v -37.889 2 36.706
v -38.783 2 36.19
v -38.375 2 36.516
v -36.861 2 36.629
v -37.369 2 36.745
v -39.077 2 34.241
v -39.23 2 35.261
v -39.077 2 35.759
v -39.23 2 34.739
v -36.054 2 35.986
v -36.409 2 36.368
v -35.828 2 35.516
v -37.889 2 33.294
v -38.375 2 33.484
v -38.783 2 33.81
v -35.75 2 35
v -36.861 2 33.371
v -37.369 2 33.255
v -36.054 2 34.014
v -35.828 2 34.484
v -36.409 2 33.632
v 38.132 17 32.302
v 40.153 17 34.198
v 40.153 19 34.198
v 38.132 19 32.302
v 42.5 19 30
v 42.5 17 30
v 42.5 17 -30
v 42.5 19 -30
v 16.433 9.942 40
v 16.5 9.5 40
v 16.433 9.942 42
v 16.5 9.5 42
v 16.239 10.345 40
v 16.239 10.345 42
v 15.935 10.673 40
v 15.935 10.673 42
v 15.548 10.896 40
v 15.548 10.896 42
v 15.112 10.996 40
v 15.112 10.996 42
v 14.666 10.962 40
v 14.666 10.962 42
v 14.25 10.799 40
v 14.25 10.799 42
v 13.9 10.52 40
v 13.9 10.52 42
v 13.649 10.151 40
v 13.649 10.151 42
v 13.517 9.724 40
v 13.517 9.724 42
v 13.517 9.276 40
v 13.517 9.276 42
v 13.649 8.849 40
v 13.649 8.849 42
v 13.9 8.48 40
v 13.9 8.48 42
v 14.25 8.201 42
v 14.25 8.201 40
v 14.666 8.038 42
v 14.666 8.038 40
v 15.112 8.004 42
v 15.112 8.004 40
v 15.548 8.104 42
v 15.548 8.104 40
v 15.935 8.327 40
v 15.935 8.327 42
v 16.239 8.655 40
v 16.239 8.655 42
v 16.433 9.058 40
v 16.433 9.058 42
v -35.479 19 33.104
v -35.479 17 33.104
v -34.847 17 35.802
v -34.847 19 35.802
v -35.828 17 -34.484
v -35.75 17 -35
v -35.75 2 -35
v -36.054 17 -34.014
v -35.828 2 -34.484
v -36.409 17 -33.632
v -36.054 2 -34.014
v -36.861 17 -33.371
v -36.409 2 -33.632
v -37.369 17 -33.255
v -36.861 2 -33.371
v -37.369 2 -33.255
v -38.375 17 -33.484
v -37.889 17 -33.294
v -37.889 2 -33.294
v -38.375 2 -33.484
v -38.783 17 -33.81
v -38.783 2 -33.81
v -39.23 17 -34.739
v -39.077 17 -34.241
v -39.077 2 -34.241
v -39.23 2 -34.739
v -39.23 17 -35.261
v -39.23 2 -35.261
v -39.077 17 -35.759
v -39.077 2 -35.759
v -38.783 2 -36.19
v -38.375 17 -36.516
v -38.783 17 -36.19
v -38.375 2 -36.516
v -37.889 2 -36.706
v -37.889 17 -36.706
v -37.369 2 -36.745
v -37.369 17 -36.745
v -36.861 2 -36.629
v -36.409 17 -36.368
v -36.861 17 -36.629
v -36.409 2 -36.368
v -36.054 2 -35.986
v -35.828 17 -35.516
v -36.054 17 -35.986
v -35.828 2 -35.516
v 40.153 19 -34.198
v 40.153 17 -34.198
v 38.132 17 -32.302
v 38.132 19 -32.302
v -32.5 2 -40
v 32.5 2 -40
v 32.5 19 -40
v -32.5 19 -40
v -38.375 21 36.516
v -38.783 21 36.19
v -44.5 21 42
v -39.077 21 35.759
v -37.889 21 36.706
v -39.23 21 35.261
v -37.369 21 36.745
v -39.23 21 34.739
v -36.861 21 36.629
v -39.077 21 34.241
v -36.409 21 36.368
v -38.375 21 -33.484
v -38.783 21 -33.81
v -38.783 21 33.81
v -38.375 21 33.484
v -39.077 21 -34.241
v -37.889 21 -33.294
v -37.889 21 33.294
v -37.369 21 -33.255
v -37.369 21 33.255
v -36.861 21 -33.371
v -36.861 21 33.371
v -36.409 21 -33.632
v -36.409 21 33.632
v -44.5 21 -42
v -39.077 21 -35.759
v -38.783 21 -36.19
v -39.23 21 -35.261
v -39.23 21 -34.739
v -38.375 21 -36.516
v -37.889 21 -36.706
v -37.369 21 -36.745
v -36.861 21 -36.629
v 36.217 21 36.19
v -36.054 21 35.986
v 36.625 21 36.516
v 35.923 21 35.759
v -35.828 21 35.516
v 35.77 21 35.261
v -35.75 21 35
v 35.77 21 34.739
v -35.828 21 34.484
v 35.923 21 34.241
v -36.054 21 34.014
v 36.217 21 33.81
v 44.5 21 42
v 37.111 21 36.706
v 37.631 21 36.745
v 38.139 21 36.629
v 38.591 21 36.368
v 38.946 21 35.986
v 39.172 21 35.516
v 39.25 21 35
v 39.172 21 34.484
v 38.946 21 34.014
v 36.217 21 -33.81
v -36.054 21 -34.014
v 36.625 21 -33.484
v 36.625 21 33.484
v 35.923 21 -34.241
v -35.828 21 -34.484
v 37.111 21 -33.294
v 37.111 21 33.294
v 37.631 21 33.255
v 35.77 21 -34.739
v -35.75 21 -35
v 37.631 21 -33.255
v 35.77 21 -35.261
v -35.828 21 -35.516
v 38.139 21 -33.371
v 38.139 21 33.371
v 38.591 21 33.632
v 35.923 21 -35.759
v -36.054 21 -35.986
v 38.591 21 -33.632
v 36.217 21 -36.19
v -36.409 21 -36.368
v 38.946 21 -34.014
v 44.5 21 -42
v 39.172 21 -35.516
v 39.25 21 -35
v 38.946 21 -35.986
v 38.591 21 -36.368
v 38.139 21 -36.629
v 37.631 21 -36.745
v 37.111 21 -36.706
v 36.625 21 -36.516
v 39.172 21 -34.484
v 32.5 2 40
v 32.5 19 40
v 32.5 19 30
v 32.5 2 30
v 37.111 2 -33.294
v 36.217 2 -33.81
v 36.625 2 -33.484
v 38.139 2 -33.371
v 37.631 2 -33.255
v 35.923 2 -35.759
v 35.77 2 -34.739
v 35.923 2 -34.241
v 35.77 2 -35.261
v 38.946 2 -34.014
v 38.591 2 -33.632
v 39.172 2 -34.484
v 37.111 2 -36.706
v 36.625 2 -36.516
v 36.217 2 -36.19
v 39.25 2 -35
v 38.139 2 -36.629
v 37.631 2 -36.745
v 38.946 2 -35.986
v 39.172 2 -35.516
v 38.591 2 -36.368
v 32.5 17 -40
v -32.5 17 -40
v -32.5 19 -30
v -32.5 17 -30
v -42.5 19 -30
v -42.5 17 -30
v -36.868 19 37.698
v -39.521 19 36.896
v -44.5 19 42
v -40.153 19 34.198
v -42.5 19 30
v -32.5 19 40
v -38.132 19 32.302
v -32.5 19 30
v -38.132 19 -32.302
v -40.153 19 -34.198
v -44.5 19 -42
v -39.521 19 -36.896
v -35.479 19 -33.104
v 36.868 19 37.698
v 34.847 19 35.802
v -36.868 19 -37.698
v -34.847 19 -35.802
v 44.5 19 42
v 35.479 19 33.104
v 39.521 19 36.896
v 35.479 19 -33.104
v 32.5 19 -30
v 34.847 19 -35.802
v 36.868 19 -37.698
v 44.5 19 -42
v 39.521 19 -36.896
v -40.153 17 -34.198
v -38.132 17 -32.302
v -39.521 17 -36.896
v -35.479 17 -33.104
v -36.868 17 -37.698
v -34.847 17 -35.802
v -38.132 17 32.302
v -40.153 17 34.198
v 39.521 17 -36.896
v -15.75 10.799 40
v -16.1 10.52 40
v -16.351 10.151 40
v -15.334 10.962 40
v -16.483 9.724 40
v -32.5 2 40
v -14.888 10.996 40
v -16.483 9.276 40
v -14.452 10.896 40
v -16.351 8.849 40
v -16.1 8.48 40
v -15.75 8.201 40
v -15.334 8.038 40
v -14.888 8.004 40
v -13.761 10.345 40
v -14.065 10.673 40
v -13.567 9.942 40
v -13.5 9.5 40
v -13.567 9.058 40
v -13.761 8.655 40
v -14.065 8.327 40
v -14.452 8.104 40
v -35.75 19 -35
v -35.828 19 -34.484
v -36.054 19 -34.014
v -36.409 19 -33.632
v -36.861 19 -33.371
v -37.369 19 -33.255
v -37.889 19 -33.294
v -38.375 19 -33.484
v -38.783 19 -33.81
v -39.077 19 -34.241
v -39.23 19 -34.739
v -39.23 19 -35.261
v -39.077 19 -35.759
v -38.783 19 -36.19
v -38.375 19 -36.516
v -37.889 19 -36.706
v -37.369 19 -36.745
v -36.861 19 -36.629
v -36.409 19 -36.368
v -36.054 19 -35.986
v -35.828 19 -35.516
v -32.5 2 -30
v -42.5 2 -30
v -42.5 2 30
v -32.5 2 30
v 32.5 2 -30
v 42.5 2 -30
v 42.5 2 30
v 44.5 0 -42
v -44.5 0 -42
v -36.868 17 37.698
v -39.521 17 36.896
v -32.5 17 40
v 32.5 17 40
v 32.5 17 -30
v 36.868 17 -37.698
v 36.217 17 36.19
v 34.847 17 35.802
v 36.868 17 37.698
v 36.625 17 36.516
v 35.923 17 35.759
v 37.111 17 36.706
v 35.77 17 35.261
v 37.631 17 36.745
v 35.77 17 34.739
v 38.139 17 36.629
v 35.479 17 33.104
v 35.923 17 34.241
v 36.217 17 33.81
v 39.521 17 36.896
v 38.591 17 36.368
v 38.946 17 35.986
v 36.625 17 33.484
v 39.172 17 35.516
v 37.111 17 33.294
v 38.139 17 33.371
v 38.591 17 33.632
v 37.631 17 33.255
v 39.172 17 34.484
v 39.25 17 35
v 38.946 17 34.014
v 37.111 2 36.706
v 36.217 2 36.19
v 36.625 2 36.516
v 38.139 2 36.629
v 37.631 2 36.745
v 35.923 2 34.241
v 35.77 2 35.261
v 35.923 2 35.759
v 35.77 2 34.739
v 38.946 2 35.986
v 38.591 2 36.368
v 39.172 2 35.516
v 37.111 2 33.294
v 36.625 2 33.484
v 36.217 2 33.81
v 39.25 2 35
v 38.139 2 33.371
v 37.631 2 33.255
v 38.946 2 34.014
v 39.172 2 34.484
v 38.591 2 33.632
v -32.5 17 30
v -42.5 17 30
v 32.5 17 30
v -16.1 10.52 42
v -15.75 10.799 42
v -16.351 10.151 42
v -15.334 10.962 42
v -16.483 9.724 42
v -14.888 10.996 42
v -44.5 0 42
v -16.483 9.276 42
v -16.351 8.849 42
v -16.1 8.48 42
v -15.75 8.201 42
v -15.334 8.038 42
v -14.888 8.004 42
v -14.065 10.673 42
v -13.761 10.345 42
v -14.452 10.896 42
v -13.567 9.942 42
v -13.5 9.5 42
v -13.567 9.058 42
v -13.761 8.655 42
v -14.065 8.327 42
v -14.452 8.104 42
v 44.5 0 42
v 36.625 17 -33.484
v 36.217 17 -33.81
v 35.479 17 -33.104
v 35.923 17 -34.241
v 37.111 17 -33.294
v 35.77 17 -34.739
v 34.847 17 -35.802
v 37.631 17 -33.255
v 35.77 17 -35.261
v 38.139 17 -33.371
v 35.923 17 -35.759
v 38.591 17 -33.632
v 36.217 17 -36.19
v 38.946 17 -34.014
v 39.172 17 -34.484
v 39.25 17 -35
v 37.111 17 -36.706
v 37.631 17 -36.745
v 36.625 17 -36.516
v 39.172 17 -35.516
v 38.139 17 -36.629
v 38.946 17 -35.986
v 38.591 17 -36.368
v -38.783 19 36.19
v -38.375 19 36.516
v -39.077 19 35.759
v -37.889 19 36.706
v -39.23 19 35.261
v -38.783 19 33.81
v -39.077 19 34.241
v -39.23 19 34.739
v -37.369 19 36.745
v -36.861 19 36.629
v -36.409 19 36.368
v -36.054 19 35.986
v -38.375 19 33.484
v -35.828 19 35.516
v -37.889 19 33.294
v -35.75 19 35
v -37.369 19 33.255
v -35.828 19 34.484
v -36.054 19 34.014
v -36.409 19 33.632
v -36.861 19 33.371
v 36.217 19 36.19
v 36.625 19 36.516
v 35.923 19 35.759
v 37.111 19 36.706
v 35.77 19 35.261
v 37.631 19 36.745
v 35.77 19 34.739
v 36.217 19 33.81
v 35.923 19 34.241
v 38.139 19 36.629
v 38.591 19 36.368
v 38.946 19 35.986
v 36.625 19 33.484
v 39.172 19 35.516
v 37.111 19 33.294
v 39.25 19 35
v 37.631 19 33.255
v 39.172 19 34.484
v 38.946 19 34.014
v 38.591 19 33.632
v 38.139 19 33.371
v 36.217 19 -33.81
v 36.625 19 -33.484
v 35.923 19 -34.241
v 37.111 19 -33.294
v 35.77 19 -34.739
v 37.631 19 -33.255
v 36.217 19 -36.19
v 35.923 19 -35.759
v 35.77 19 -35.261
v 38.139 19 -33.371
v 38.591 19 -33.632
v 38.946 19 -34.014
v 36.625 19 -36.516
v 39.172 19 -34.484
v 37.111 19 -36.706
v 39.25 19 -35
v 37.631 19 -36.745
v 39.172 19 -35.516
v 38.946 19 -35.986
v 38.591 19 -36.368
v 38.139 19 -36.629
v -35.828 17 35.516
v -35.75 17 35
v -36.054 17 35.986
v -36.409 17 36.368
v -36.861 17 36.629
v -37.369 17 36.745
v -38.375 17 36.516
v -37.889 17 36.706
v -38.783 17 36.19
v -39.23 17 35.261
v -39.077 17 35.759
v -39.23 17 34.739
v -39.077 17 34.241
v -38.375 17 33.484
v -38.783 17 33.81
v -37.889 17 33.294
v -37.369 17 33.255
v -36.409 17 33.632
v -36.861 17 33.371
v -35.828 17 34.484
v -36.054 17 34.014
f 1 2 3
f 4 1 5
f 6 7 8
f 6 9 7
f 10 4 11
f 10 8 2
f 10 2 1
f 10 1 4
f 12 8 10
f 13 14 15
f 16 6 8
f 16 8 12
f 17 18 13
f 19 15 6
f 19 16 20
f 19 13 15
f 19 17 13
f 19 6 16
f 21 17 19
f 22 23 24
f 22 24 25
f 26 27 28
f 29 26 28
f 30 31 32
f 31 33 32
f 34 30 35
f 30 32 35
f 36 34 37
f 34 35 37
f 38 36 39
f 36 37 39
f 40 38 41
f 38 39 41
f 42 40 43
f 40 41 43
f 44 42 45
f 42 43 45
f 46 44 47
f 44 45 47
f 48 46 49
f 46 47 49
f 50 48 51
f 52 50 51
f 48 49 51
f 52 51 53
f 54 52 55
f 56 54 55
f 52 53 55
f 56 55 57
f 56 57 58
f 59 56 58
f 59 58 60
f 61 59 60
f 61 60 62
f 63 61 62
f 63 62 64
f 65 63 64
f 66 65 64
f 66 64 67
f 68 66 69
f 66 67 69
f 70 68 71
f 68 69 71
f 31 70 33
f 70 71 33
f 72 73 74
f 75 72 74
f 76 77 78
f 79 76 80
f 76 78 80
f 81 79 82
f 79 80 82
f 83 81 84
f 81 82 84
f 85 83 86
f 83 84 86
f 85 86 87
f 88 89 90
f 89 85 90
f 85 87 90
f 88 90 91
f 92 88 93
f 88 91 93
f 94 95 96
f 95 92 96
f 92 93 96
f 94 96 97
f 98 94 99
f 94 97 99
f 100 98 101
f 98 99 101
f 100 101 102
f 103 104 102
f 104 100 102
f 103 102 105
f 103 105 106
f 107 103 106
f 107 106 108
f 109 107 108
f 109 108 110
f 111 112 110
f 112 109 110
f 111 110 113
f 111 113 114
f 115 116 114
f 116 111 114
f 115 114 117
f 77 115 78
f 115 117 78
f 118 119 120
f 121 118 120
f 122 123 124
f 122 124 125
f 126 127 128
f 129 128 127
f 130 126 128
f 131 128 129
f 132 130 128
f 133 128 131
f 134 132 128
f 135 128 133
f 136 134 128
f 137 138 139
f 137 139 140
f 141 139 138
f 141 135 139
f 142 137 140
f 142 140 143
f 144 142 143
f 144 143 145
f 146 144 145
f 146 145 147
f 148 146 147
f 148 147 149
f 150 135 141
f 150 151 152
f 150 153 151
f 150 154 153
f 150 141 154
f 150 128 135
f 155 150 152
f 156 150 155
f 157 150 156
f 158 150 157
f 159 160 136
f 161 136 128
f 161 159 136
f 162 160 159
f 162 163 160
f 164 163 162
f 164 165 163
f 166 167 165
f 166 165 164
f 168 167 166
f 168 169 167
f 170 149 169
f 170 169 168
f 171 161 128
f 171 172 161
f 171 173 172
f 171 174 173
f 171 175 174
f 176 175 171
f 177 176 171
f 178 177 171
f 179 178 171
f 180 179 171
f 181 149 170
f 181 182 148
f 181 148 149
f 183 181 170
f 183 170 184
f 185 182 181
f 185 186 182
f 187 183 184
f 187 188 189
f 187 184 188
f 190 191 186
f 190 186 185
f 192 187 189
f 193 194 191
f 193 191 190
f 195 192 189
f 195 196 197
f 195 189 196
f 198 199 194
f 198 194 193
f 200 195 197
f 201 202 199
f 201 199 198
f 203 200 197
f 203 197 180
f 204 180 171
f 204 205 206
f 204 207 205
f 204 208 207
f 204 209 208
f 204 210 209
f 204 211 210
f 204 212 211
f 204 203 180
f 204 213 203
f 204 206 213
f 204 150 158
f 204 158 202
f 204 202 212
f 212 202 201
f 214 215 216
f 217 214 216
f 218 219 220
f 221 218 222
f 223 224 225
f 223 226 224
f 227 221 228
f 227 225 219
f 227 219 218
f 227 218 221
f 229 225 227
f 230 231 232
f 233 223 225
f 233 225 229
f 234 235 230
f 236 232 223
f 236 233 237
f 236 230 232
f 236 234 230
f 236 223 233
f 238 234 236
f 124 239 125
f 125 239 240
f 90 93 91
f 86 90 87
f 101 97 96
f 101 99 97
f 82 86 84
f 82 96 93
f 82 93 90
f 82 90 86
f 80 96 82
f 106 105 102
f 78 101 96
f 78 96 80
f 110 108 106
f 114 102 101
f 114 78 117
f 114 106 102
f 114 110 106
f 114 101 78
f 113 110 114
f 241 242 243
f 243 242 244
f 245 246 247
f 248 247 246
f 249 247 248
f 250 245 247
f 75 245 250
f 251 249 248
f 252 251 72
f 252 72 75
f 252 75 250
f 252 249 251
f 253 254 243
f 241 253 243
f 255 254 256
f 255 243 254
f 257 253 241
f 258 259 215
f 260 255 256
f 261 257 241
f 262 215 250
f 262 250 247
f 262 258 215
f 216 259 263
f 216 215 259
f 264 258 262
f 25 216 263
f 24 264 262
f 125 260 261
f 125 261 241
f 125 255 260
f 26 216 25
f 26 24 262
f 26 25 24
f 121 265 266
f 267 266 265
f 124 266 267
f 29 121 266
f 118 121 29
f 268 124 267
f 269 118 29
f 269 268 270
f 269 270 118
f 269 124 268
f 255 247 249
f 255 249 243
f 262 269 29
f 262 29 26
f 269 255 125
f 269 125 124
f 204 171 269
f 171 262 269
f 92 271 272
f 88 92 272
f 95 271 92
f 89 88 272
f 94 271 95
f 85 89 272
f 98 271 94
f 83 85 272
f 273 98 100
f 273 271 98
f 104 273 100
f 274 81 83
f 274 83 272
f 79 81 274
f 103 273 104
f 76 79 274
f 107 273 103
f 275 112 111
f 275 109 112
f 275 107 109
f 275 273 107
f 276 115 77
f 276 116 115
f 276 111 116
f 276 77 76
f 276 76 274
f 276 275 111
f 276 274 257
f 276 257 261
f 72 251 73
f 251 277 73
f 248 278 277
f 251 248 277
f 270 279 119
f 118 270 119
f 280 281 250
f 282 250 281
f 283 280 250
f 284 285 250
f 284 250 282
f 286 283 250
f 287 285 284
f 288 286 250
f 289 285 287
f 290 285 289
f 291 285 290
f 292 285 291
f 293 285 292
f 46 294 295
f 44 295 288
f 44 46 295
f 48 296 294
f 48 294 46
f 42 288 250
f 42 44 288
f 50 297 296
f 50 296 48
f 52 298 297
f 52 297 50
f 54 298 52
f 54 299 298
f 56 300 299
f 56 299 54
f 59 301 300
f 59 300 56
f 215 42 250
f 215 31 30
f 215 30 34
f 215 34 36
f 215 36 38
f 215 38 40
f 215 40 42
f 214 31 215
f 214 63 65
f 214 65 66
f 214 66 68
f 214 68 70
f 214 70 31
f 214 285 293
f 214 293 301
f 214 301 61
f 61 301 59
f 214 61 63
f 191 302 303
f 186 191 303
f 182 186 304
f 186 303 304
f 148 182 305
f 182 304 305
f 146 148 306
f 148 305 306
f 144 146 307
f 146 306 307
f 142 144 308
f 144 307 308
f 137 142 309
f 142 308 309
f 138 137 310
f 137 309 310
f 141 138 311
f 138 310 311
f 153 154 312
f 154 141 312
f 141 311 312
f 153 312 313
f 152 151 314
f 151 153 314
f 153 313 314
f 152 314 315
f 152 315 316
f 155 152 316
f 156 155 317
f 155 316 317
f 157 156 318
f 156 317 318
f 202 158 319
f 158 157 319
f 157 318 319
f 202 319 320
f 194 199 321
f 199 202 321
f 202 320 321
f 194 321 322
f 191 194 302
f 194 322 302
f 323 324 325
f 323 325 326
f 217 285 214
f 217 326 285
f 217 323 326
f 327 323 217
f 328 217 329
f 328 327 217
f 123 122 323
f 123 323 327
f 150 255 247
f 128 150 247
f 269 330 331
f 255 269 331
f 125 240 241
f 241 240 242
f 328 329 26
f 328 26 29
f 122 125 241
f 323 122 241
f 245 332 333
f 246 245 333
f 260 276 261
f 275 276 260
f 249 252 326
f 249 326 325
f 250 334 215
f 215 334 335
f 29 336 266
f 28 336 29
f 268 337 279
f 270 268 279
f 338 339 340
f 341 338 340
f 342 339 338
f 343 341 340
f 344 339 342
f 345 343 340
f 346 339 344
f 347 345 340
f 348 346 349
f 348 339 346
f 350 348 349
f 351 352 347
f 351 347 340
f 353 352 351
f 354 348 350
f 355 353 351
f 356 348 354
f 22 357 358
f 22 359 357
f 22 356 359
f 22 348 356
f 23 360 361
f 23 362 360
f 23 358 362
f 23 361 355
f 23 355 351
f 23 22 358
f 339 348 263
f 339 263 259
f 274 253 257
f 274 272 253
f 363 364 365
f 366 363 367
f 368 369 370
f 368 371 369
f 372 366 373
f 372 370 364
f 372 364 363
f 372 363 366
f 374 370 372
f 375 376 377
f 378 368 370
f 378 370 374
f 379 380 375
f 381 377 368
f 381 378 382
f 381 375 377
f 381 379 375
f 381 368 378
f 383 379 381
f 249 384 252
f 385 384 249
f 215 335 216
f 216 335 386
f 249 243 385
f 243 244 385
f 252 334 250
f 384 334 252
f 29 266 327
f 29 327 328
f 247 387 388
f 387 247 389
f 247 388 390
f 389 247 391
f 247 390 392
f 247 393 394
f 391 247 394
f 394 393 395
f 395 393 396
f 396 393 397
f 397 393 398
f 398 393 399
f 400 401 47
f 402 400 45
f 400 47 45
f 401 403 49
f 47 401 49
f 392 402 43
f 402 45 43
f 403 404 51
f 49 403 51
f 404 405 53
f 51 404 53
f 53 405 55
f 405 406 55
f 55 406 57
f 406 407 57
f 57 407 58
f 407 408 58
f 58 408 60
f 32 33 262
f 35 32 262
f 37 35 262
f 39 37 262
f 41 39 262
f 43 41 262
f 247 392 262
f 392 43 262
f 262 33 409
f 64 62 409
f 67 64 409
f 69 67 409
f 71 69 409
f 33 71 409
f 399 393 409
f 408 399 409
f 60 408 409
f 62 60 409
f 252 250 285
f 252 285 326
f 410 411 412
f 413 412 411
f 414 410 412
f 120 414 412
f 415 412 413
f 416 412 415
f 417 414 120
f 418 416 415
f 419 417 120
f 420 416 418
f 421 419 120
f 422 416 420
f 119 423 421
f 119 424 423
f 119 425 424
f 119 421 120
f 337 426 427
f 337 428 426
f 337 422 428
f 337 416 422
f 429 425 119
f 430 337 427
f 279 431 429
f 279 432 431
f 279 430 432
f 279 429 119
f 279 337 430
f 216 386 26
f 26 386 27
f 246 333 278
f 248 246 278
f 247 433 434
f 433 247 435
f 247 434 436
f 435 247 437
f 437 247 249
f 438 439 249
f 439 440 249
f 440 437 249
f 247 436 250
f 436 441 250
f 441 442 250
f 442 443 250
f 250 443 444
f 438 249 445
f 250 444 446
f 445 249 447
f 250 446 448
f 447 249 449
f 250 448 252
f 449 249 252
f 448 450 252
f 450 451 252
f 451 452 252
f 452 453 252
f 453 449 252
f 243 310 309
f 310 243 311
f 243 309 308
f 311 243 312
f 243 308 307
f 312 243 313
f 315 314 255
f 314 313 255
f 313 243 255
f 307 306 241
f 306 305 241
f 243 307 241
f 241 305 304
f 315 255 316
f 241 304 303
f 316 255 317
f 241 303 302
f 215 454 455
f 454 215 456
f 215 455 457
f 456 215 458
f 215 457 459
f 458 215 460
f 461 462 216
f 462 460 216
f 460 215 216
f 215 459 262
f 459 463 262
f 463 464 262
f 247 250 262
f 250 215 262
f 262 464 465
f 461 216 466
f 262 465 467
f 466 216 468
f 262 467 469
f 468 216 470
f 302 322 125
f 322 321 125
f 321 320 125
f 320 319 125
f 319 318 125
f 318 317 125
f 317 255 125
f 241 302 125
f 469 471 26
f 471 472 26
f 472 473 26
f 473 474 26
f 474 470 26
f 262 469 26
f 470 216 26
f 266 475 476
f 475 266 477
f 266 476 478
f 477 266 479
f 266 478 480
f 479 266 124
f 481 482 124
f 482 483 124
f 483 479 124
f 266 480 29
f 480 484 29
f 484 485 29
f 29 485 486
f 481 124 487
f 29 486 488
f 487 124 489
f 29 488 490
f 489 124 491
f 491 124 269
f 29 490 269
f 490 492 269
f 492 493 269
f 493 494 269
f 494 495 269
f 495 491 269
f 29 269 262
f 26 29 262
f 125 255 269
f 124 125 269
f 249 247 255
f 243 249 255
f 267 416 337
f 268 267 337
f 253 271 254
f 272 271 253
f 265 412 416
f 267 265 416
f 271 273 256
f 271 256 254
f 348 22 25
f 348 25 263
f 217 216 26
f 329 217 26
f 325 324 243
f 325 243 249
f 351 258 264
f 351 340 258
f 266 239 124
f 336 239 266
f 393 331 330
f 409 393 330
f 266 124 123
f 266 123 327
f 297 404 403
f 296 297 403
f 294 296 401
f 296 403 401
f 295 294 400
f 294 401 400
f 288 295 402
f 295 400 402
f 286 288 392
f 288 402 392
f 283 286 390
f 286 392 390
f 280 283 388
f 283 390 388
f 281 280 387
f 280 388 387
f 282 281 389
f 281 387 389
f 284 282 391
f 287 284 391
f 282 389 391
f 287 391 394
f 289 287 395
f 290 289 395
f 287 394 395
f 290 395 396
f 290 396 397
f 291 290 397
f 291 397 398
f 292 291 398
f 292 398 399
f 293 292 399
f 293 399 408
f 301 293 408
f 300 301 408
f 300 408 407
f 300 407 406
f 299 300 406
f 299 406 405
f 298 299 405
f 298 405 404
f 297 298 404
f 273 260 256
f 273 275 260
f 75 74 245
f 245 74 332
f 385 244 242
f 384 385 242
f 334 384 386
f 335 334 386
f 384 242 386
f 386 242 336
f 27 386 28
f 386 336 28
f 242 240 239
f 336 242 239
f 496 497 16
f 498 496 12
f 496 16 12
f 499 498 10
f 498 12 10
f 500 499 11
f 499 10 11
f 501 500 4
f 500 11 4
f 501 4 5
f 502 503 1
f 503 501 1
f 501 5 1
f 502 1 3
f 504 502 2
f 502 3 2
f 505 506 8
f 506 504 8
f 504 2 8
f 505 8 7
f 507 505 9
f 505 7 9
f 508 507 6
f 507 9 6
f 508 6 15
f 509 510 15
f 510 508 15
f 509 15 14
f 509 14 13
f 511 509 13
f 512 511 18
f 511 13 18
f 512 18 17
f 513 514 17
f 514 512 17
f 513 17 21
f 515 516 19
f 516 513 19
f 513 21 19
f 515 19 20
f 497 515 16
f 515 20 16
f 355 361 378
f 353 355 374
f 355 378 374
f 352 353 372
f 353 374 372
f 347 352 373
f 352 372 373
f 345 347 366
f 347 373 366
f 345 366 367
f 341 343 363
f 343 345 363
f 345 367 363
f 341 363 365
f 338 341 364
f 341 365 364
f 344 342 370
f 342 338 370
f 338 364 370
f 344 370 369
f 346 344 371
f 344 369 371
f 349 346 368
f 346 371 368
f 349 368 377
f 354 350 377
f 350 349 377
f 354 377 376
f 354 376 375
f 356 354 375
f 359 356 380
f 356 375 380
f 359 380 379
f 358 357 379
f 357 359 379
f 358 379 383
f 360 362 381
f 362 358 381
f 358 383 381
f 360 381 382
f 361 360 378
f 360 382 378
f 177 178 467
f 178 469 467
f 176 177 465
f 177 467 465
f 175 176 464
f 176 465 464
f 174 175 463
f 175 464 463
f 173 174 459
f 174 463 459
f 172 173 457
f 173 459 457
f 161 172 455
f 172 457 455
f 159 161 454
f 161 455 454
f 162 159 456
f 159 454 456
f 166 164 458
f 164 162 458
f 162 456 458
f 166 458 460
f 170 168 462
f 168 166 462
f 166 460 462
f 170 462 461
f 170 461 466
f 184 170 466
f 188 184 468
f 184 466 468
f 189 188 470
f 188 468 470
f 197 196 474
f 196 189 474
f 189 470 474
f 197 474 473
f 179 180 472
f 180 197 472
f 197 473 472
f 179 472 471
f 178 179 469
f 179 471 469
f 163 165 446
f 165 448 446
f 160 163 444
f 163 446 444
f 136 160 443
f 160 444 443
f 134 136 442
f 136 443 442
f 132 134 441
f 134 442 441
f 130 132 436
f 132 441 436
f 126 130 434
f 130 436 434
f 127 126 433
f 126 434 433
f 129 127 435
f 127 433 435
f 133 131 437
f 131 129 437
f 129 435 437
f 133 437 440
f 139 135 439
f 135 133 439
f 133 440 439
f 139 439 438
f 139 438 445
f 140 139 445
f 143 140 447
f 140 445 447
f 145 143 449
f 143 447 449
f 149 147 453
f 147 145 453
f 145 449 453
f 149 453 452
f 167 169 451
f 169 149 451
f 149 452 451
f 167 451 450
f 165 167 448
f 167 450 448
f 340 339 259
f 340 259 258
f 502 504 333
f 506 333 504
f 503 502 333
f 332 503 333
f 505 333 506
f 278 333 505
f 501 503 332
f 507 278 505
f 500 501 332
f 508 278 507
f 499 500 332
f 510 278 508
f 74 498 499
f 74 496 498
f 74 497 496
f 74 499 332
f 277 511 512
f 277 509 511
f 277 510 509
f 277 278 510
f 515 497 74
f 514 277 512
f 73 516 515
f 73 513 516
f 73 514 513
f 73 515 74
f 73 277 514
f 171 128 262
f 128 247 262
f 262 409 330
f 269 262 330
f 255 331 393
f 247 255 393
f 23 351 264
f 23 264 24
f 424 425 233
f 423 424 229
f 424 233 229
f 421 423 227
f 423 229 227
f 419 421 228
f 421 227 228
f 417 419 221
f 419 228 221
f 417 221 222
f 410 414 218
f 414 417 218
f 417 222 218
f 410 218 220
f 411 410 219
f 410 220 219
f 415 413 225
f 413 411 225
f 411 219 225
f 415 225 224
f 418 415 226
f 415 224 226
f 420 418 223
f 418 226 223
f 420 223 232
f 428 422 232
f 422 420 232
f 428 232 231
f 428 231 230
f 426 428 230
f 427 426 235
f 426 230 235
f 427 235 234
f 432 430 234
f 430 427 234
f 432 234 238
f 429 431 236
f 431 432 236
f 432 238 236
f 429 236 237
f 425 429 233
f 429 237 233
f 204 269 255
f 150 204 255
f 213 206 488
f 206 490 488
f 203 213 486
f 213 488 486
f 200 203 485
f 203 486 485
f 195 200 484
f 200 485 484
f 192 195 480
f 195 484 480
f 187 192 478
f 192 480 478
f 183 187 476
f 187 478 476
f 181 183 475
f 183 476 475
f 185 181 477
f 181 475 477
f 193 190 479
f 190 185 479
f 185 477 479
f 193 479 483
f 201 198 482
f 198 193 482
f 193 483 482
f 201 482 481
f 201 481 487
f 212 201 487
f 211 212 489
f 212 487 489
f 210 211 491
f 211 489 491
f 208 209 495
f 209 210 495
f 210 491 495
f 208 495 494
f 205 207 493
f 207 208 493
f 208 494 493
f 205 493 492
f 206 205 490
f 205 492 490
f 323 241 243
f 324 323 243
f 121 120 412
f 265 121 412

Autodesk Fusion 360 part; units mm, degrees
sketch "Sketch1" plane through (0, 0, 0) normal (0, 1, 0) x (1, 0, 0)
  line L0 (42.5, 40) -> (-42.5, 40)
  line L1 (-42.5, 40) -> (-42.5, -40)
  line L2 (-42.5, -40) -> (42.5, -40)
  line L3 (42.5, -40) -> (42.5, 40)
  line L4 (42.5, 40) -> (-42.5, -40) construction
  line L5 (-42.5, 40) -> (42.5, -40) construction
  circle A0 centre (-37.5, 35) radius 1.75
  line L6 (-38.1316, 32.3017) -> (-35.479, 33.1038)
  line L7 (-35.479, 33.1038) -> (-34.8474, 35.8022)
  line L8 (-34.8474, 35.8022) -> (-36.8684, 37.6983)
  line L9 (-36.8684, 37.6983) -> (-39.521, 36.8962)
  line L10 (-39.521, 36.8962) -> (-40.1526, 34.1978)
  line L11 (-40.1526, 34.1978) -> (-38.1316, 32.3017)
  line L12 (0, 0) -> (0, 40) construction
  line L13 (0, 0) -> (-42.5, 0) construction
  line L14 (34.8474, 35.8022) -> (36.8684, 37.6983)
  line L15 (36.8684, 37.6983) -> (39.521, 36.8962)
  line L16 (35.479, 33.1038) -> (34.8474, 35.8022)
  line L17 (38.1316, 32.3017) -> (35.479, 33.1038)
  circle A1 centre (37.5, 35) radius 1.75
  line L18 (39.521, 36.8962) -> (40.1526, 34.1978)
  line L19 (40.1526, 34.1978) -> (38.1316, 32.3017)
  line L20 (-40.1526, -34.1978) -> (-38.1316, -32.3017)
  circle A2 centre (-37.5, -35) radius 1.75
  line L21 (-42.5, -40) -> (42.5, 40) construction
  line L22 (-36.8684, -37.6983) -> (-39.521, -36.8962)
  line L23 (-39.521, -36.8962) -> (-40.1526, -34.1978)
  line L24 (-35.479, -33.1038) -> (-34.8474, -35.8022)
  line L25 (-38.1316, -32.3017) -> (-35.479, -33.1038)
  line L26 (-34.8474, -35.8022) -> (-36.8684, -37.6983)
  line L27 (0, 0) -> (0, -40) construction
  line L28 (34.8474, -35.8022) -> (36.8684, -37.6983)
  line L29 (35.479, -33.1038) -> (34.8474, -35.8022)
  line L30 (-42.5, 40) -> (42.5, -40) construction
  line L31 (42.5, -40) -> (-42.5, 40) construction
  line L32 (38.1316, -32.3017) -> (35.479, -33.1038)
  line L33 (36.8684, -37.6983) -> (39.521, -36.8962)
  line L34 (39.521, -36.8962) -> (40.1526, -34.1978)
  line L35 (40.1526, -34.1978) -> (38.1316, -32.3017)
  circle A3 centre (37.5, -35) radius 1.75
  line L36 (-44.5, -42) -> (44.5, -42)
  line L37 (44.5, -42) -> (44.5, 42)
  line L38 (44.5, 42) -> (-44.5, 42)
  line L39 (-44.5, 42) -> (-44.5, -42)
  line L40 (-44.5, -42) -> (44.5, 42) construction
  line L41 (44.5, -42) -> (-44.5, 42) construction
  line L42 (-42.5, 40) -> (-32.5, 40)
  line L43 (-32.5, 40) -> (-32.5, 30)
  line L44 (-32.5, 30) -> (-42.5, 30)
  line L45 (-42.5, 30) -> (-42.5, 40)
  line L46 (32.5, 40) -> (32.5, 30)
  line L47 (32.5, 30) -> (42.5, 30)
  line L48 (-32.5, -40) -> (-32.5, -30)
  line L49 (-32.5, -30) -> (-42.5, -30)
  line L50 (32.5, -30) -> (42.5, -30)
  line L51 (32.5, -40) -> (32.5, -30)
  point P0 (-37.5, 35)
  point P1 (37.5, 35)
  point P2 (-37.5, -35)
  point P3 (37.5, -35)
  dimension "d1" = 85
  dimension "d2" = 80
  dimension "d3" = 3.5
  dimension "d4" = 4.8
  dimension "d5" = 5
  dimension "d6" = 5
  dimension "d13" = 2
  dimension "d14" = 2
  dimension "d17" = 5
  dimension "d18" = 5
extrude "Extrude1" add sketch "Sketch1" along normal blind 2 contours L0 L3 L46 L47 | L0 L1 L2 L3 L43 L44 L46 L47 L48 L49 L50 L51 | L0 L1 L42 L43 L44 L45 | L2 L3 L50 L51 | L1 L2 L48 L49 | A0 | L6 L7 L8 L9 L10 L11 | L14 L15 L16 L17 L18 L19 | A1 | L20 L22 L23 L24 L25 L26 | A2 | L28 L29 L32 L33 L34 L35 | A3 | L36 L37 L38 L39 makes body 1
extrude "Extrude2" add sketch "Sketch1" along normal blind 17 contours L0 L3 L46 L47 | L0 L1 L42 L43 L44 L45 | L2 L3 L50 L51 | L1 L2 L48 L49 | L6 L7 L8 L9 L10 L11 | L14 L15 L16 L17 L18 L19 | L20 L22 L23 L24 L25 L26 | L28 L29 L32 L33 L34 L35 | L36 L37 L38 L39 bodies 1
extrude "Extrude3" add sketch "Sketch1" along normal blind 2 from surface at 17 contours L0 L3 L46 L47 | L0 L1 L42 L43 L44 L45 | L2 L3 L50 L51 | L1 L2 L48 L49 | L36 L37 L38 L39 bodies 1
extrude "Extrude4" add sketch "Sketch1" along normal blind 2 from surface at 19 separate body contours L0 L3 L46 L47 | L0 L1 L2 L3 L43 L44 L46 L47 L48 L49 L50 L51 | L0 L1 L42 L43 L44 L45 | L2 L3 L50 L51 | L1 L2 L48 L49 | L6 L7 L8 L9 L10 L11 | L14 L15 L16 L17 L18 L19 | L20 L22 L23 L24 L25 L26 | L28 L29 L32 L33 L34 L35 | L36 L37 L38 L39 makes body 2
extrude "Extrude5" add sketch "Sketch1" along normal blind 2 from surface at 17 contours L0 L1 L2 L3 L43 L44 L46 L47 L48 L49 L50 L51 bodies 2
sketch "Sketch4" plane through (0, 0, 42) normal (0, 0, 1) x (1, 0, 0)
  line L0 (-44.5, 0) -> (44.5, 0)
  line L1 (44.5, 0) -> (44.5, 19)
  line L2 (44.5, 19) -> (-44.5, 19)
  line L3 (-44.5, 19) -> (-44.5, 0)
  line L4 (0, 0) -> (0, 19) construction
  line L5 (44.5, 9.5) -> (-44.5, 9.5) construction
  circle A0 centre (15, 9.5) radius 1.5
  circle A1 centre (-15, 9.5) radius 1.5
  dimension "d29" = 3
  dimension "d30" = 15
extrude "Extrude6" cut sketch "Sketch4" against normal blind 12 contours A0 | A1 bodies 1
equation "d1 = long"
equation "d2 = la"
equation "long = 85 mm"
equation "la = 80 mm"
equation "h = 15 mm"
equation "e = 2 mm"
equation "d11 = e"
equation "d13 = e"
equation "d14 = e"
equation "d15 = h + e"
equation "d19 = h + e"
equation "d20 = e"
equation "d22 = h + 2 * e"
equation "d23 = e"
equation "d25 = h + e"
equation "d26 = e"
